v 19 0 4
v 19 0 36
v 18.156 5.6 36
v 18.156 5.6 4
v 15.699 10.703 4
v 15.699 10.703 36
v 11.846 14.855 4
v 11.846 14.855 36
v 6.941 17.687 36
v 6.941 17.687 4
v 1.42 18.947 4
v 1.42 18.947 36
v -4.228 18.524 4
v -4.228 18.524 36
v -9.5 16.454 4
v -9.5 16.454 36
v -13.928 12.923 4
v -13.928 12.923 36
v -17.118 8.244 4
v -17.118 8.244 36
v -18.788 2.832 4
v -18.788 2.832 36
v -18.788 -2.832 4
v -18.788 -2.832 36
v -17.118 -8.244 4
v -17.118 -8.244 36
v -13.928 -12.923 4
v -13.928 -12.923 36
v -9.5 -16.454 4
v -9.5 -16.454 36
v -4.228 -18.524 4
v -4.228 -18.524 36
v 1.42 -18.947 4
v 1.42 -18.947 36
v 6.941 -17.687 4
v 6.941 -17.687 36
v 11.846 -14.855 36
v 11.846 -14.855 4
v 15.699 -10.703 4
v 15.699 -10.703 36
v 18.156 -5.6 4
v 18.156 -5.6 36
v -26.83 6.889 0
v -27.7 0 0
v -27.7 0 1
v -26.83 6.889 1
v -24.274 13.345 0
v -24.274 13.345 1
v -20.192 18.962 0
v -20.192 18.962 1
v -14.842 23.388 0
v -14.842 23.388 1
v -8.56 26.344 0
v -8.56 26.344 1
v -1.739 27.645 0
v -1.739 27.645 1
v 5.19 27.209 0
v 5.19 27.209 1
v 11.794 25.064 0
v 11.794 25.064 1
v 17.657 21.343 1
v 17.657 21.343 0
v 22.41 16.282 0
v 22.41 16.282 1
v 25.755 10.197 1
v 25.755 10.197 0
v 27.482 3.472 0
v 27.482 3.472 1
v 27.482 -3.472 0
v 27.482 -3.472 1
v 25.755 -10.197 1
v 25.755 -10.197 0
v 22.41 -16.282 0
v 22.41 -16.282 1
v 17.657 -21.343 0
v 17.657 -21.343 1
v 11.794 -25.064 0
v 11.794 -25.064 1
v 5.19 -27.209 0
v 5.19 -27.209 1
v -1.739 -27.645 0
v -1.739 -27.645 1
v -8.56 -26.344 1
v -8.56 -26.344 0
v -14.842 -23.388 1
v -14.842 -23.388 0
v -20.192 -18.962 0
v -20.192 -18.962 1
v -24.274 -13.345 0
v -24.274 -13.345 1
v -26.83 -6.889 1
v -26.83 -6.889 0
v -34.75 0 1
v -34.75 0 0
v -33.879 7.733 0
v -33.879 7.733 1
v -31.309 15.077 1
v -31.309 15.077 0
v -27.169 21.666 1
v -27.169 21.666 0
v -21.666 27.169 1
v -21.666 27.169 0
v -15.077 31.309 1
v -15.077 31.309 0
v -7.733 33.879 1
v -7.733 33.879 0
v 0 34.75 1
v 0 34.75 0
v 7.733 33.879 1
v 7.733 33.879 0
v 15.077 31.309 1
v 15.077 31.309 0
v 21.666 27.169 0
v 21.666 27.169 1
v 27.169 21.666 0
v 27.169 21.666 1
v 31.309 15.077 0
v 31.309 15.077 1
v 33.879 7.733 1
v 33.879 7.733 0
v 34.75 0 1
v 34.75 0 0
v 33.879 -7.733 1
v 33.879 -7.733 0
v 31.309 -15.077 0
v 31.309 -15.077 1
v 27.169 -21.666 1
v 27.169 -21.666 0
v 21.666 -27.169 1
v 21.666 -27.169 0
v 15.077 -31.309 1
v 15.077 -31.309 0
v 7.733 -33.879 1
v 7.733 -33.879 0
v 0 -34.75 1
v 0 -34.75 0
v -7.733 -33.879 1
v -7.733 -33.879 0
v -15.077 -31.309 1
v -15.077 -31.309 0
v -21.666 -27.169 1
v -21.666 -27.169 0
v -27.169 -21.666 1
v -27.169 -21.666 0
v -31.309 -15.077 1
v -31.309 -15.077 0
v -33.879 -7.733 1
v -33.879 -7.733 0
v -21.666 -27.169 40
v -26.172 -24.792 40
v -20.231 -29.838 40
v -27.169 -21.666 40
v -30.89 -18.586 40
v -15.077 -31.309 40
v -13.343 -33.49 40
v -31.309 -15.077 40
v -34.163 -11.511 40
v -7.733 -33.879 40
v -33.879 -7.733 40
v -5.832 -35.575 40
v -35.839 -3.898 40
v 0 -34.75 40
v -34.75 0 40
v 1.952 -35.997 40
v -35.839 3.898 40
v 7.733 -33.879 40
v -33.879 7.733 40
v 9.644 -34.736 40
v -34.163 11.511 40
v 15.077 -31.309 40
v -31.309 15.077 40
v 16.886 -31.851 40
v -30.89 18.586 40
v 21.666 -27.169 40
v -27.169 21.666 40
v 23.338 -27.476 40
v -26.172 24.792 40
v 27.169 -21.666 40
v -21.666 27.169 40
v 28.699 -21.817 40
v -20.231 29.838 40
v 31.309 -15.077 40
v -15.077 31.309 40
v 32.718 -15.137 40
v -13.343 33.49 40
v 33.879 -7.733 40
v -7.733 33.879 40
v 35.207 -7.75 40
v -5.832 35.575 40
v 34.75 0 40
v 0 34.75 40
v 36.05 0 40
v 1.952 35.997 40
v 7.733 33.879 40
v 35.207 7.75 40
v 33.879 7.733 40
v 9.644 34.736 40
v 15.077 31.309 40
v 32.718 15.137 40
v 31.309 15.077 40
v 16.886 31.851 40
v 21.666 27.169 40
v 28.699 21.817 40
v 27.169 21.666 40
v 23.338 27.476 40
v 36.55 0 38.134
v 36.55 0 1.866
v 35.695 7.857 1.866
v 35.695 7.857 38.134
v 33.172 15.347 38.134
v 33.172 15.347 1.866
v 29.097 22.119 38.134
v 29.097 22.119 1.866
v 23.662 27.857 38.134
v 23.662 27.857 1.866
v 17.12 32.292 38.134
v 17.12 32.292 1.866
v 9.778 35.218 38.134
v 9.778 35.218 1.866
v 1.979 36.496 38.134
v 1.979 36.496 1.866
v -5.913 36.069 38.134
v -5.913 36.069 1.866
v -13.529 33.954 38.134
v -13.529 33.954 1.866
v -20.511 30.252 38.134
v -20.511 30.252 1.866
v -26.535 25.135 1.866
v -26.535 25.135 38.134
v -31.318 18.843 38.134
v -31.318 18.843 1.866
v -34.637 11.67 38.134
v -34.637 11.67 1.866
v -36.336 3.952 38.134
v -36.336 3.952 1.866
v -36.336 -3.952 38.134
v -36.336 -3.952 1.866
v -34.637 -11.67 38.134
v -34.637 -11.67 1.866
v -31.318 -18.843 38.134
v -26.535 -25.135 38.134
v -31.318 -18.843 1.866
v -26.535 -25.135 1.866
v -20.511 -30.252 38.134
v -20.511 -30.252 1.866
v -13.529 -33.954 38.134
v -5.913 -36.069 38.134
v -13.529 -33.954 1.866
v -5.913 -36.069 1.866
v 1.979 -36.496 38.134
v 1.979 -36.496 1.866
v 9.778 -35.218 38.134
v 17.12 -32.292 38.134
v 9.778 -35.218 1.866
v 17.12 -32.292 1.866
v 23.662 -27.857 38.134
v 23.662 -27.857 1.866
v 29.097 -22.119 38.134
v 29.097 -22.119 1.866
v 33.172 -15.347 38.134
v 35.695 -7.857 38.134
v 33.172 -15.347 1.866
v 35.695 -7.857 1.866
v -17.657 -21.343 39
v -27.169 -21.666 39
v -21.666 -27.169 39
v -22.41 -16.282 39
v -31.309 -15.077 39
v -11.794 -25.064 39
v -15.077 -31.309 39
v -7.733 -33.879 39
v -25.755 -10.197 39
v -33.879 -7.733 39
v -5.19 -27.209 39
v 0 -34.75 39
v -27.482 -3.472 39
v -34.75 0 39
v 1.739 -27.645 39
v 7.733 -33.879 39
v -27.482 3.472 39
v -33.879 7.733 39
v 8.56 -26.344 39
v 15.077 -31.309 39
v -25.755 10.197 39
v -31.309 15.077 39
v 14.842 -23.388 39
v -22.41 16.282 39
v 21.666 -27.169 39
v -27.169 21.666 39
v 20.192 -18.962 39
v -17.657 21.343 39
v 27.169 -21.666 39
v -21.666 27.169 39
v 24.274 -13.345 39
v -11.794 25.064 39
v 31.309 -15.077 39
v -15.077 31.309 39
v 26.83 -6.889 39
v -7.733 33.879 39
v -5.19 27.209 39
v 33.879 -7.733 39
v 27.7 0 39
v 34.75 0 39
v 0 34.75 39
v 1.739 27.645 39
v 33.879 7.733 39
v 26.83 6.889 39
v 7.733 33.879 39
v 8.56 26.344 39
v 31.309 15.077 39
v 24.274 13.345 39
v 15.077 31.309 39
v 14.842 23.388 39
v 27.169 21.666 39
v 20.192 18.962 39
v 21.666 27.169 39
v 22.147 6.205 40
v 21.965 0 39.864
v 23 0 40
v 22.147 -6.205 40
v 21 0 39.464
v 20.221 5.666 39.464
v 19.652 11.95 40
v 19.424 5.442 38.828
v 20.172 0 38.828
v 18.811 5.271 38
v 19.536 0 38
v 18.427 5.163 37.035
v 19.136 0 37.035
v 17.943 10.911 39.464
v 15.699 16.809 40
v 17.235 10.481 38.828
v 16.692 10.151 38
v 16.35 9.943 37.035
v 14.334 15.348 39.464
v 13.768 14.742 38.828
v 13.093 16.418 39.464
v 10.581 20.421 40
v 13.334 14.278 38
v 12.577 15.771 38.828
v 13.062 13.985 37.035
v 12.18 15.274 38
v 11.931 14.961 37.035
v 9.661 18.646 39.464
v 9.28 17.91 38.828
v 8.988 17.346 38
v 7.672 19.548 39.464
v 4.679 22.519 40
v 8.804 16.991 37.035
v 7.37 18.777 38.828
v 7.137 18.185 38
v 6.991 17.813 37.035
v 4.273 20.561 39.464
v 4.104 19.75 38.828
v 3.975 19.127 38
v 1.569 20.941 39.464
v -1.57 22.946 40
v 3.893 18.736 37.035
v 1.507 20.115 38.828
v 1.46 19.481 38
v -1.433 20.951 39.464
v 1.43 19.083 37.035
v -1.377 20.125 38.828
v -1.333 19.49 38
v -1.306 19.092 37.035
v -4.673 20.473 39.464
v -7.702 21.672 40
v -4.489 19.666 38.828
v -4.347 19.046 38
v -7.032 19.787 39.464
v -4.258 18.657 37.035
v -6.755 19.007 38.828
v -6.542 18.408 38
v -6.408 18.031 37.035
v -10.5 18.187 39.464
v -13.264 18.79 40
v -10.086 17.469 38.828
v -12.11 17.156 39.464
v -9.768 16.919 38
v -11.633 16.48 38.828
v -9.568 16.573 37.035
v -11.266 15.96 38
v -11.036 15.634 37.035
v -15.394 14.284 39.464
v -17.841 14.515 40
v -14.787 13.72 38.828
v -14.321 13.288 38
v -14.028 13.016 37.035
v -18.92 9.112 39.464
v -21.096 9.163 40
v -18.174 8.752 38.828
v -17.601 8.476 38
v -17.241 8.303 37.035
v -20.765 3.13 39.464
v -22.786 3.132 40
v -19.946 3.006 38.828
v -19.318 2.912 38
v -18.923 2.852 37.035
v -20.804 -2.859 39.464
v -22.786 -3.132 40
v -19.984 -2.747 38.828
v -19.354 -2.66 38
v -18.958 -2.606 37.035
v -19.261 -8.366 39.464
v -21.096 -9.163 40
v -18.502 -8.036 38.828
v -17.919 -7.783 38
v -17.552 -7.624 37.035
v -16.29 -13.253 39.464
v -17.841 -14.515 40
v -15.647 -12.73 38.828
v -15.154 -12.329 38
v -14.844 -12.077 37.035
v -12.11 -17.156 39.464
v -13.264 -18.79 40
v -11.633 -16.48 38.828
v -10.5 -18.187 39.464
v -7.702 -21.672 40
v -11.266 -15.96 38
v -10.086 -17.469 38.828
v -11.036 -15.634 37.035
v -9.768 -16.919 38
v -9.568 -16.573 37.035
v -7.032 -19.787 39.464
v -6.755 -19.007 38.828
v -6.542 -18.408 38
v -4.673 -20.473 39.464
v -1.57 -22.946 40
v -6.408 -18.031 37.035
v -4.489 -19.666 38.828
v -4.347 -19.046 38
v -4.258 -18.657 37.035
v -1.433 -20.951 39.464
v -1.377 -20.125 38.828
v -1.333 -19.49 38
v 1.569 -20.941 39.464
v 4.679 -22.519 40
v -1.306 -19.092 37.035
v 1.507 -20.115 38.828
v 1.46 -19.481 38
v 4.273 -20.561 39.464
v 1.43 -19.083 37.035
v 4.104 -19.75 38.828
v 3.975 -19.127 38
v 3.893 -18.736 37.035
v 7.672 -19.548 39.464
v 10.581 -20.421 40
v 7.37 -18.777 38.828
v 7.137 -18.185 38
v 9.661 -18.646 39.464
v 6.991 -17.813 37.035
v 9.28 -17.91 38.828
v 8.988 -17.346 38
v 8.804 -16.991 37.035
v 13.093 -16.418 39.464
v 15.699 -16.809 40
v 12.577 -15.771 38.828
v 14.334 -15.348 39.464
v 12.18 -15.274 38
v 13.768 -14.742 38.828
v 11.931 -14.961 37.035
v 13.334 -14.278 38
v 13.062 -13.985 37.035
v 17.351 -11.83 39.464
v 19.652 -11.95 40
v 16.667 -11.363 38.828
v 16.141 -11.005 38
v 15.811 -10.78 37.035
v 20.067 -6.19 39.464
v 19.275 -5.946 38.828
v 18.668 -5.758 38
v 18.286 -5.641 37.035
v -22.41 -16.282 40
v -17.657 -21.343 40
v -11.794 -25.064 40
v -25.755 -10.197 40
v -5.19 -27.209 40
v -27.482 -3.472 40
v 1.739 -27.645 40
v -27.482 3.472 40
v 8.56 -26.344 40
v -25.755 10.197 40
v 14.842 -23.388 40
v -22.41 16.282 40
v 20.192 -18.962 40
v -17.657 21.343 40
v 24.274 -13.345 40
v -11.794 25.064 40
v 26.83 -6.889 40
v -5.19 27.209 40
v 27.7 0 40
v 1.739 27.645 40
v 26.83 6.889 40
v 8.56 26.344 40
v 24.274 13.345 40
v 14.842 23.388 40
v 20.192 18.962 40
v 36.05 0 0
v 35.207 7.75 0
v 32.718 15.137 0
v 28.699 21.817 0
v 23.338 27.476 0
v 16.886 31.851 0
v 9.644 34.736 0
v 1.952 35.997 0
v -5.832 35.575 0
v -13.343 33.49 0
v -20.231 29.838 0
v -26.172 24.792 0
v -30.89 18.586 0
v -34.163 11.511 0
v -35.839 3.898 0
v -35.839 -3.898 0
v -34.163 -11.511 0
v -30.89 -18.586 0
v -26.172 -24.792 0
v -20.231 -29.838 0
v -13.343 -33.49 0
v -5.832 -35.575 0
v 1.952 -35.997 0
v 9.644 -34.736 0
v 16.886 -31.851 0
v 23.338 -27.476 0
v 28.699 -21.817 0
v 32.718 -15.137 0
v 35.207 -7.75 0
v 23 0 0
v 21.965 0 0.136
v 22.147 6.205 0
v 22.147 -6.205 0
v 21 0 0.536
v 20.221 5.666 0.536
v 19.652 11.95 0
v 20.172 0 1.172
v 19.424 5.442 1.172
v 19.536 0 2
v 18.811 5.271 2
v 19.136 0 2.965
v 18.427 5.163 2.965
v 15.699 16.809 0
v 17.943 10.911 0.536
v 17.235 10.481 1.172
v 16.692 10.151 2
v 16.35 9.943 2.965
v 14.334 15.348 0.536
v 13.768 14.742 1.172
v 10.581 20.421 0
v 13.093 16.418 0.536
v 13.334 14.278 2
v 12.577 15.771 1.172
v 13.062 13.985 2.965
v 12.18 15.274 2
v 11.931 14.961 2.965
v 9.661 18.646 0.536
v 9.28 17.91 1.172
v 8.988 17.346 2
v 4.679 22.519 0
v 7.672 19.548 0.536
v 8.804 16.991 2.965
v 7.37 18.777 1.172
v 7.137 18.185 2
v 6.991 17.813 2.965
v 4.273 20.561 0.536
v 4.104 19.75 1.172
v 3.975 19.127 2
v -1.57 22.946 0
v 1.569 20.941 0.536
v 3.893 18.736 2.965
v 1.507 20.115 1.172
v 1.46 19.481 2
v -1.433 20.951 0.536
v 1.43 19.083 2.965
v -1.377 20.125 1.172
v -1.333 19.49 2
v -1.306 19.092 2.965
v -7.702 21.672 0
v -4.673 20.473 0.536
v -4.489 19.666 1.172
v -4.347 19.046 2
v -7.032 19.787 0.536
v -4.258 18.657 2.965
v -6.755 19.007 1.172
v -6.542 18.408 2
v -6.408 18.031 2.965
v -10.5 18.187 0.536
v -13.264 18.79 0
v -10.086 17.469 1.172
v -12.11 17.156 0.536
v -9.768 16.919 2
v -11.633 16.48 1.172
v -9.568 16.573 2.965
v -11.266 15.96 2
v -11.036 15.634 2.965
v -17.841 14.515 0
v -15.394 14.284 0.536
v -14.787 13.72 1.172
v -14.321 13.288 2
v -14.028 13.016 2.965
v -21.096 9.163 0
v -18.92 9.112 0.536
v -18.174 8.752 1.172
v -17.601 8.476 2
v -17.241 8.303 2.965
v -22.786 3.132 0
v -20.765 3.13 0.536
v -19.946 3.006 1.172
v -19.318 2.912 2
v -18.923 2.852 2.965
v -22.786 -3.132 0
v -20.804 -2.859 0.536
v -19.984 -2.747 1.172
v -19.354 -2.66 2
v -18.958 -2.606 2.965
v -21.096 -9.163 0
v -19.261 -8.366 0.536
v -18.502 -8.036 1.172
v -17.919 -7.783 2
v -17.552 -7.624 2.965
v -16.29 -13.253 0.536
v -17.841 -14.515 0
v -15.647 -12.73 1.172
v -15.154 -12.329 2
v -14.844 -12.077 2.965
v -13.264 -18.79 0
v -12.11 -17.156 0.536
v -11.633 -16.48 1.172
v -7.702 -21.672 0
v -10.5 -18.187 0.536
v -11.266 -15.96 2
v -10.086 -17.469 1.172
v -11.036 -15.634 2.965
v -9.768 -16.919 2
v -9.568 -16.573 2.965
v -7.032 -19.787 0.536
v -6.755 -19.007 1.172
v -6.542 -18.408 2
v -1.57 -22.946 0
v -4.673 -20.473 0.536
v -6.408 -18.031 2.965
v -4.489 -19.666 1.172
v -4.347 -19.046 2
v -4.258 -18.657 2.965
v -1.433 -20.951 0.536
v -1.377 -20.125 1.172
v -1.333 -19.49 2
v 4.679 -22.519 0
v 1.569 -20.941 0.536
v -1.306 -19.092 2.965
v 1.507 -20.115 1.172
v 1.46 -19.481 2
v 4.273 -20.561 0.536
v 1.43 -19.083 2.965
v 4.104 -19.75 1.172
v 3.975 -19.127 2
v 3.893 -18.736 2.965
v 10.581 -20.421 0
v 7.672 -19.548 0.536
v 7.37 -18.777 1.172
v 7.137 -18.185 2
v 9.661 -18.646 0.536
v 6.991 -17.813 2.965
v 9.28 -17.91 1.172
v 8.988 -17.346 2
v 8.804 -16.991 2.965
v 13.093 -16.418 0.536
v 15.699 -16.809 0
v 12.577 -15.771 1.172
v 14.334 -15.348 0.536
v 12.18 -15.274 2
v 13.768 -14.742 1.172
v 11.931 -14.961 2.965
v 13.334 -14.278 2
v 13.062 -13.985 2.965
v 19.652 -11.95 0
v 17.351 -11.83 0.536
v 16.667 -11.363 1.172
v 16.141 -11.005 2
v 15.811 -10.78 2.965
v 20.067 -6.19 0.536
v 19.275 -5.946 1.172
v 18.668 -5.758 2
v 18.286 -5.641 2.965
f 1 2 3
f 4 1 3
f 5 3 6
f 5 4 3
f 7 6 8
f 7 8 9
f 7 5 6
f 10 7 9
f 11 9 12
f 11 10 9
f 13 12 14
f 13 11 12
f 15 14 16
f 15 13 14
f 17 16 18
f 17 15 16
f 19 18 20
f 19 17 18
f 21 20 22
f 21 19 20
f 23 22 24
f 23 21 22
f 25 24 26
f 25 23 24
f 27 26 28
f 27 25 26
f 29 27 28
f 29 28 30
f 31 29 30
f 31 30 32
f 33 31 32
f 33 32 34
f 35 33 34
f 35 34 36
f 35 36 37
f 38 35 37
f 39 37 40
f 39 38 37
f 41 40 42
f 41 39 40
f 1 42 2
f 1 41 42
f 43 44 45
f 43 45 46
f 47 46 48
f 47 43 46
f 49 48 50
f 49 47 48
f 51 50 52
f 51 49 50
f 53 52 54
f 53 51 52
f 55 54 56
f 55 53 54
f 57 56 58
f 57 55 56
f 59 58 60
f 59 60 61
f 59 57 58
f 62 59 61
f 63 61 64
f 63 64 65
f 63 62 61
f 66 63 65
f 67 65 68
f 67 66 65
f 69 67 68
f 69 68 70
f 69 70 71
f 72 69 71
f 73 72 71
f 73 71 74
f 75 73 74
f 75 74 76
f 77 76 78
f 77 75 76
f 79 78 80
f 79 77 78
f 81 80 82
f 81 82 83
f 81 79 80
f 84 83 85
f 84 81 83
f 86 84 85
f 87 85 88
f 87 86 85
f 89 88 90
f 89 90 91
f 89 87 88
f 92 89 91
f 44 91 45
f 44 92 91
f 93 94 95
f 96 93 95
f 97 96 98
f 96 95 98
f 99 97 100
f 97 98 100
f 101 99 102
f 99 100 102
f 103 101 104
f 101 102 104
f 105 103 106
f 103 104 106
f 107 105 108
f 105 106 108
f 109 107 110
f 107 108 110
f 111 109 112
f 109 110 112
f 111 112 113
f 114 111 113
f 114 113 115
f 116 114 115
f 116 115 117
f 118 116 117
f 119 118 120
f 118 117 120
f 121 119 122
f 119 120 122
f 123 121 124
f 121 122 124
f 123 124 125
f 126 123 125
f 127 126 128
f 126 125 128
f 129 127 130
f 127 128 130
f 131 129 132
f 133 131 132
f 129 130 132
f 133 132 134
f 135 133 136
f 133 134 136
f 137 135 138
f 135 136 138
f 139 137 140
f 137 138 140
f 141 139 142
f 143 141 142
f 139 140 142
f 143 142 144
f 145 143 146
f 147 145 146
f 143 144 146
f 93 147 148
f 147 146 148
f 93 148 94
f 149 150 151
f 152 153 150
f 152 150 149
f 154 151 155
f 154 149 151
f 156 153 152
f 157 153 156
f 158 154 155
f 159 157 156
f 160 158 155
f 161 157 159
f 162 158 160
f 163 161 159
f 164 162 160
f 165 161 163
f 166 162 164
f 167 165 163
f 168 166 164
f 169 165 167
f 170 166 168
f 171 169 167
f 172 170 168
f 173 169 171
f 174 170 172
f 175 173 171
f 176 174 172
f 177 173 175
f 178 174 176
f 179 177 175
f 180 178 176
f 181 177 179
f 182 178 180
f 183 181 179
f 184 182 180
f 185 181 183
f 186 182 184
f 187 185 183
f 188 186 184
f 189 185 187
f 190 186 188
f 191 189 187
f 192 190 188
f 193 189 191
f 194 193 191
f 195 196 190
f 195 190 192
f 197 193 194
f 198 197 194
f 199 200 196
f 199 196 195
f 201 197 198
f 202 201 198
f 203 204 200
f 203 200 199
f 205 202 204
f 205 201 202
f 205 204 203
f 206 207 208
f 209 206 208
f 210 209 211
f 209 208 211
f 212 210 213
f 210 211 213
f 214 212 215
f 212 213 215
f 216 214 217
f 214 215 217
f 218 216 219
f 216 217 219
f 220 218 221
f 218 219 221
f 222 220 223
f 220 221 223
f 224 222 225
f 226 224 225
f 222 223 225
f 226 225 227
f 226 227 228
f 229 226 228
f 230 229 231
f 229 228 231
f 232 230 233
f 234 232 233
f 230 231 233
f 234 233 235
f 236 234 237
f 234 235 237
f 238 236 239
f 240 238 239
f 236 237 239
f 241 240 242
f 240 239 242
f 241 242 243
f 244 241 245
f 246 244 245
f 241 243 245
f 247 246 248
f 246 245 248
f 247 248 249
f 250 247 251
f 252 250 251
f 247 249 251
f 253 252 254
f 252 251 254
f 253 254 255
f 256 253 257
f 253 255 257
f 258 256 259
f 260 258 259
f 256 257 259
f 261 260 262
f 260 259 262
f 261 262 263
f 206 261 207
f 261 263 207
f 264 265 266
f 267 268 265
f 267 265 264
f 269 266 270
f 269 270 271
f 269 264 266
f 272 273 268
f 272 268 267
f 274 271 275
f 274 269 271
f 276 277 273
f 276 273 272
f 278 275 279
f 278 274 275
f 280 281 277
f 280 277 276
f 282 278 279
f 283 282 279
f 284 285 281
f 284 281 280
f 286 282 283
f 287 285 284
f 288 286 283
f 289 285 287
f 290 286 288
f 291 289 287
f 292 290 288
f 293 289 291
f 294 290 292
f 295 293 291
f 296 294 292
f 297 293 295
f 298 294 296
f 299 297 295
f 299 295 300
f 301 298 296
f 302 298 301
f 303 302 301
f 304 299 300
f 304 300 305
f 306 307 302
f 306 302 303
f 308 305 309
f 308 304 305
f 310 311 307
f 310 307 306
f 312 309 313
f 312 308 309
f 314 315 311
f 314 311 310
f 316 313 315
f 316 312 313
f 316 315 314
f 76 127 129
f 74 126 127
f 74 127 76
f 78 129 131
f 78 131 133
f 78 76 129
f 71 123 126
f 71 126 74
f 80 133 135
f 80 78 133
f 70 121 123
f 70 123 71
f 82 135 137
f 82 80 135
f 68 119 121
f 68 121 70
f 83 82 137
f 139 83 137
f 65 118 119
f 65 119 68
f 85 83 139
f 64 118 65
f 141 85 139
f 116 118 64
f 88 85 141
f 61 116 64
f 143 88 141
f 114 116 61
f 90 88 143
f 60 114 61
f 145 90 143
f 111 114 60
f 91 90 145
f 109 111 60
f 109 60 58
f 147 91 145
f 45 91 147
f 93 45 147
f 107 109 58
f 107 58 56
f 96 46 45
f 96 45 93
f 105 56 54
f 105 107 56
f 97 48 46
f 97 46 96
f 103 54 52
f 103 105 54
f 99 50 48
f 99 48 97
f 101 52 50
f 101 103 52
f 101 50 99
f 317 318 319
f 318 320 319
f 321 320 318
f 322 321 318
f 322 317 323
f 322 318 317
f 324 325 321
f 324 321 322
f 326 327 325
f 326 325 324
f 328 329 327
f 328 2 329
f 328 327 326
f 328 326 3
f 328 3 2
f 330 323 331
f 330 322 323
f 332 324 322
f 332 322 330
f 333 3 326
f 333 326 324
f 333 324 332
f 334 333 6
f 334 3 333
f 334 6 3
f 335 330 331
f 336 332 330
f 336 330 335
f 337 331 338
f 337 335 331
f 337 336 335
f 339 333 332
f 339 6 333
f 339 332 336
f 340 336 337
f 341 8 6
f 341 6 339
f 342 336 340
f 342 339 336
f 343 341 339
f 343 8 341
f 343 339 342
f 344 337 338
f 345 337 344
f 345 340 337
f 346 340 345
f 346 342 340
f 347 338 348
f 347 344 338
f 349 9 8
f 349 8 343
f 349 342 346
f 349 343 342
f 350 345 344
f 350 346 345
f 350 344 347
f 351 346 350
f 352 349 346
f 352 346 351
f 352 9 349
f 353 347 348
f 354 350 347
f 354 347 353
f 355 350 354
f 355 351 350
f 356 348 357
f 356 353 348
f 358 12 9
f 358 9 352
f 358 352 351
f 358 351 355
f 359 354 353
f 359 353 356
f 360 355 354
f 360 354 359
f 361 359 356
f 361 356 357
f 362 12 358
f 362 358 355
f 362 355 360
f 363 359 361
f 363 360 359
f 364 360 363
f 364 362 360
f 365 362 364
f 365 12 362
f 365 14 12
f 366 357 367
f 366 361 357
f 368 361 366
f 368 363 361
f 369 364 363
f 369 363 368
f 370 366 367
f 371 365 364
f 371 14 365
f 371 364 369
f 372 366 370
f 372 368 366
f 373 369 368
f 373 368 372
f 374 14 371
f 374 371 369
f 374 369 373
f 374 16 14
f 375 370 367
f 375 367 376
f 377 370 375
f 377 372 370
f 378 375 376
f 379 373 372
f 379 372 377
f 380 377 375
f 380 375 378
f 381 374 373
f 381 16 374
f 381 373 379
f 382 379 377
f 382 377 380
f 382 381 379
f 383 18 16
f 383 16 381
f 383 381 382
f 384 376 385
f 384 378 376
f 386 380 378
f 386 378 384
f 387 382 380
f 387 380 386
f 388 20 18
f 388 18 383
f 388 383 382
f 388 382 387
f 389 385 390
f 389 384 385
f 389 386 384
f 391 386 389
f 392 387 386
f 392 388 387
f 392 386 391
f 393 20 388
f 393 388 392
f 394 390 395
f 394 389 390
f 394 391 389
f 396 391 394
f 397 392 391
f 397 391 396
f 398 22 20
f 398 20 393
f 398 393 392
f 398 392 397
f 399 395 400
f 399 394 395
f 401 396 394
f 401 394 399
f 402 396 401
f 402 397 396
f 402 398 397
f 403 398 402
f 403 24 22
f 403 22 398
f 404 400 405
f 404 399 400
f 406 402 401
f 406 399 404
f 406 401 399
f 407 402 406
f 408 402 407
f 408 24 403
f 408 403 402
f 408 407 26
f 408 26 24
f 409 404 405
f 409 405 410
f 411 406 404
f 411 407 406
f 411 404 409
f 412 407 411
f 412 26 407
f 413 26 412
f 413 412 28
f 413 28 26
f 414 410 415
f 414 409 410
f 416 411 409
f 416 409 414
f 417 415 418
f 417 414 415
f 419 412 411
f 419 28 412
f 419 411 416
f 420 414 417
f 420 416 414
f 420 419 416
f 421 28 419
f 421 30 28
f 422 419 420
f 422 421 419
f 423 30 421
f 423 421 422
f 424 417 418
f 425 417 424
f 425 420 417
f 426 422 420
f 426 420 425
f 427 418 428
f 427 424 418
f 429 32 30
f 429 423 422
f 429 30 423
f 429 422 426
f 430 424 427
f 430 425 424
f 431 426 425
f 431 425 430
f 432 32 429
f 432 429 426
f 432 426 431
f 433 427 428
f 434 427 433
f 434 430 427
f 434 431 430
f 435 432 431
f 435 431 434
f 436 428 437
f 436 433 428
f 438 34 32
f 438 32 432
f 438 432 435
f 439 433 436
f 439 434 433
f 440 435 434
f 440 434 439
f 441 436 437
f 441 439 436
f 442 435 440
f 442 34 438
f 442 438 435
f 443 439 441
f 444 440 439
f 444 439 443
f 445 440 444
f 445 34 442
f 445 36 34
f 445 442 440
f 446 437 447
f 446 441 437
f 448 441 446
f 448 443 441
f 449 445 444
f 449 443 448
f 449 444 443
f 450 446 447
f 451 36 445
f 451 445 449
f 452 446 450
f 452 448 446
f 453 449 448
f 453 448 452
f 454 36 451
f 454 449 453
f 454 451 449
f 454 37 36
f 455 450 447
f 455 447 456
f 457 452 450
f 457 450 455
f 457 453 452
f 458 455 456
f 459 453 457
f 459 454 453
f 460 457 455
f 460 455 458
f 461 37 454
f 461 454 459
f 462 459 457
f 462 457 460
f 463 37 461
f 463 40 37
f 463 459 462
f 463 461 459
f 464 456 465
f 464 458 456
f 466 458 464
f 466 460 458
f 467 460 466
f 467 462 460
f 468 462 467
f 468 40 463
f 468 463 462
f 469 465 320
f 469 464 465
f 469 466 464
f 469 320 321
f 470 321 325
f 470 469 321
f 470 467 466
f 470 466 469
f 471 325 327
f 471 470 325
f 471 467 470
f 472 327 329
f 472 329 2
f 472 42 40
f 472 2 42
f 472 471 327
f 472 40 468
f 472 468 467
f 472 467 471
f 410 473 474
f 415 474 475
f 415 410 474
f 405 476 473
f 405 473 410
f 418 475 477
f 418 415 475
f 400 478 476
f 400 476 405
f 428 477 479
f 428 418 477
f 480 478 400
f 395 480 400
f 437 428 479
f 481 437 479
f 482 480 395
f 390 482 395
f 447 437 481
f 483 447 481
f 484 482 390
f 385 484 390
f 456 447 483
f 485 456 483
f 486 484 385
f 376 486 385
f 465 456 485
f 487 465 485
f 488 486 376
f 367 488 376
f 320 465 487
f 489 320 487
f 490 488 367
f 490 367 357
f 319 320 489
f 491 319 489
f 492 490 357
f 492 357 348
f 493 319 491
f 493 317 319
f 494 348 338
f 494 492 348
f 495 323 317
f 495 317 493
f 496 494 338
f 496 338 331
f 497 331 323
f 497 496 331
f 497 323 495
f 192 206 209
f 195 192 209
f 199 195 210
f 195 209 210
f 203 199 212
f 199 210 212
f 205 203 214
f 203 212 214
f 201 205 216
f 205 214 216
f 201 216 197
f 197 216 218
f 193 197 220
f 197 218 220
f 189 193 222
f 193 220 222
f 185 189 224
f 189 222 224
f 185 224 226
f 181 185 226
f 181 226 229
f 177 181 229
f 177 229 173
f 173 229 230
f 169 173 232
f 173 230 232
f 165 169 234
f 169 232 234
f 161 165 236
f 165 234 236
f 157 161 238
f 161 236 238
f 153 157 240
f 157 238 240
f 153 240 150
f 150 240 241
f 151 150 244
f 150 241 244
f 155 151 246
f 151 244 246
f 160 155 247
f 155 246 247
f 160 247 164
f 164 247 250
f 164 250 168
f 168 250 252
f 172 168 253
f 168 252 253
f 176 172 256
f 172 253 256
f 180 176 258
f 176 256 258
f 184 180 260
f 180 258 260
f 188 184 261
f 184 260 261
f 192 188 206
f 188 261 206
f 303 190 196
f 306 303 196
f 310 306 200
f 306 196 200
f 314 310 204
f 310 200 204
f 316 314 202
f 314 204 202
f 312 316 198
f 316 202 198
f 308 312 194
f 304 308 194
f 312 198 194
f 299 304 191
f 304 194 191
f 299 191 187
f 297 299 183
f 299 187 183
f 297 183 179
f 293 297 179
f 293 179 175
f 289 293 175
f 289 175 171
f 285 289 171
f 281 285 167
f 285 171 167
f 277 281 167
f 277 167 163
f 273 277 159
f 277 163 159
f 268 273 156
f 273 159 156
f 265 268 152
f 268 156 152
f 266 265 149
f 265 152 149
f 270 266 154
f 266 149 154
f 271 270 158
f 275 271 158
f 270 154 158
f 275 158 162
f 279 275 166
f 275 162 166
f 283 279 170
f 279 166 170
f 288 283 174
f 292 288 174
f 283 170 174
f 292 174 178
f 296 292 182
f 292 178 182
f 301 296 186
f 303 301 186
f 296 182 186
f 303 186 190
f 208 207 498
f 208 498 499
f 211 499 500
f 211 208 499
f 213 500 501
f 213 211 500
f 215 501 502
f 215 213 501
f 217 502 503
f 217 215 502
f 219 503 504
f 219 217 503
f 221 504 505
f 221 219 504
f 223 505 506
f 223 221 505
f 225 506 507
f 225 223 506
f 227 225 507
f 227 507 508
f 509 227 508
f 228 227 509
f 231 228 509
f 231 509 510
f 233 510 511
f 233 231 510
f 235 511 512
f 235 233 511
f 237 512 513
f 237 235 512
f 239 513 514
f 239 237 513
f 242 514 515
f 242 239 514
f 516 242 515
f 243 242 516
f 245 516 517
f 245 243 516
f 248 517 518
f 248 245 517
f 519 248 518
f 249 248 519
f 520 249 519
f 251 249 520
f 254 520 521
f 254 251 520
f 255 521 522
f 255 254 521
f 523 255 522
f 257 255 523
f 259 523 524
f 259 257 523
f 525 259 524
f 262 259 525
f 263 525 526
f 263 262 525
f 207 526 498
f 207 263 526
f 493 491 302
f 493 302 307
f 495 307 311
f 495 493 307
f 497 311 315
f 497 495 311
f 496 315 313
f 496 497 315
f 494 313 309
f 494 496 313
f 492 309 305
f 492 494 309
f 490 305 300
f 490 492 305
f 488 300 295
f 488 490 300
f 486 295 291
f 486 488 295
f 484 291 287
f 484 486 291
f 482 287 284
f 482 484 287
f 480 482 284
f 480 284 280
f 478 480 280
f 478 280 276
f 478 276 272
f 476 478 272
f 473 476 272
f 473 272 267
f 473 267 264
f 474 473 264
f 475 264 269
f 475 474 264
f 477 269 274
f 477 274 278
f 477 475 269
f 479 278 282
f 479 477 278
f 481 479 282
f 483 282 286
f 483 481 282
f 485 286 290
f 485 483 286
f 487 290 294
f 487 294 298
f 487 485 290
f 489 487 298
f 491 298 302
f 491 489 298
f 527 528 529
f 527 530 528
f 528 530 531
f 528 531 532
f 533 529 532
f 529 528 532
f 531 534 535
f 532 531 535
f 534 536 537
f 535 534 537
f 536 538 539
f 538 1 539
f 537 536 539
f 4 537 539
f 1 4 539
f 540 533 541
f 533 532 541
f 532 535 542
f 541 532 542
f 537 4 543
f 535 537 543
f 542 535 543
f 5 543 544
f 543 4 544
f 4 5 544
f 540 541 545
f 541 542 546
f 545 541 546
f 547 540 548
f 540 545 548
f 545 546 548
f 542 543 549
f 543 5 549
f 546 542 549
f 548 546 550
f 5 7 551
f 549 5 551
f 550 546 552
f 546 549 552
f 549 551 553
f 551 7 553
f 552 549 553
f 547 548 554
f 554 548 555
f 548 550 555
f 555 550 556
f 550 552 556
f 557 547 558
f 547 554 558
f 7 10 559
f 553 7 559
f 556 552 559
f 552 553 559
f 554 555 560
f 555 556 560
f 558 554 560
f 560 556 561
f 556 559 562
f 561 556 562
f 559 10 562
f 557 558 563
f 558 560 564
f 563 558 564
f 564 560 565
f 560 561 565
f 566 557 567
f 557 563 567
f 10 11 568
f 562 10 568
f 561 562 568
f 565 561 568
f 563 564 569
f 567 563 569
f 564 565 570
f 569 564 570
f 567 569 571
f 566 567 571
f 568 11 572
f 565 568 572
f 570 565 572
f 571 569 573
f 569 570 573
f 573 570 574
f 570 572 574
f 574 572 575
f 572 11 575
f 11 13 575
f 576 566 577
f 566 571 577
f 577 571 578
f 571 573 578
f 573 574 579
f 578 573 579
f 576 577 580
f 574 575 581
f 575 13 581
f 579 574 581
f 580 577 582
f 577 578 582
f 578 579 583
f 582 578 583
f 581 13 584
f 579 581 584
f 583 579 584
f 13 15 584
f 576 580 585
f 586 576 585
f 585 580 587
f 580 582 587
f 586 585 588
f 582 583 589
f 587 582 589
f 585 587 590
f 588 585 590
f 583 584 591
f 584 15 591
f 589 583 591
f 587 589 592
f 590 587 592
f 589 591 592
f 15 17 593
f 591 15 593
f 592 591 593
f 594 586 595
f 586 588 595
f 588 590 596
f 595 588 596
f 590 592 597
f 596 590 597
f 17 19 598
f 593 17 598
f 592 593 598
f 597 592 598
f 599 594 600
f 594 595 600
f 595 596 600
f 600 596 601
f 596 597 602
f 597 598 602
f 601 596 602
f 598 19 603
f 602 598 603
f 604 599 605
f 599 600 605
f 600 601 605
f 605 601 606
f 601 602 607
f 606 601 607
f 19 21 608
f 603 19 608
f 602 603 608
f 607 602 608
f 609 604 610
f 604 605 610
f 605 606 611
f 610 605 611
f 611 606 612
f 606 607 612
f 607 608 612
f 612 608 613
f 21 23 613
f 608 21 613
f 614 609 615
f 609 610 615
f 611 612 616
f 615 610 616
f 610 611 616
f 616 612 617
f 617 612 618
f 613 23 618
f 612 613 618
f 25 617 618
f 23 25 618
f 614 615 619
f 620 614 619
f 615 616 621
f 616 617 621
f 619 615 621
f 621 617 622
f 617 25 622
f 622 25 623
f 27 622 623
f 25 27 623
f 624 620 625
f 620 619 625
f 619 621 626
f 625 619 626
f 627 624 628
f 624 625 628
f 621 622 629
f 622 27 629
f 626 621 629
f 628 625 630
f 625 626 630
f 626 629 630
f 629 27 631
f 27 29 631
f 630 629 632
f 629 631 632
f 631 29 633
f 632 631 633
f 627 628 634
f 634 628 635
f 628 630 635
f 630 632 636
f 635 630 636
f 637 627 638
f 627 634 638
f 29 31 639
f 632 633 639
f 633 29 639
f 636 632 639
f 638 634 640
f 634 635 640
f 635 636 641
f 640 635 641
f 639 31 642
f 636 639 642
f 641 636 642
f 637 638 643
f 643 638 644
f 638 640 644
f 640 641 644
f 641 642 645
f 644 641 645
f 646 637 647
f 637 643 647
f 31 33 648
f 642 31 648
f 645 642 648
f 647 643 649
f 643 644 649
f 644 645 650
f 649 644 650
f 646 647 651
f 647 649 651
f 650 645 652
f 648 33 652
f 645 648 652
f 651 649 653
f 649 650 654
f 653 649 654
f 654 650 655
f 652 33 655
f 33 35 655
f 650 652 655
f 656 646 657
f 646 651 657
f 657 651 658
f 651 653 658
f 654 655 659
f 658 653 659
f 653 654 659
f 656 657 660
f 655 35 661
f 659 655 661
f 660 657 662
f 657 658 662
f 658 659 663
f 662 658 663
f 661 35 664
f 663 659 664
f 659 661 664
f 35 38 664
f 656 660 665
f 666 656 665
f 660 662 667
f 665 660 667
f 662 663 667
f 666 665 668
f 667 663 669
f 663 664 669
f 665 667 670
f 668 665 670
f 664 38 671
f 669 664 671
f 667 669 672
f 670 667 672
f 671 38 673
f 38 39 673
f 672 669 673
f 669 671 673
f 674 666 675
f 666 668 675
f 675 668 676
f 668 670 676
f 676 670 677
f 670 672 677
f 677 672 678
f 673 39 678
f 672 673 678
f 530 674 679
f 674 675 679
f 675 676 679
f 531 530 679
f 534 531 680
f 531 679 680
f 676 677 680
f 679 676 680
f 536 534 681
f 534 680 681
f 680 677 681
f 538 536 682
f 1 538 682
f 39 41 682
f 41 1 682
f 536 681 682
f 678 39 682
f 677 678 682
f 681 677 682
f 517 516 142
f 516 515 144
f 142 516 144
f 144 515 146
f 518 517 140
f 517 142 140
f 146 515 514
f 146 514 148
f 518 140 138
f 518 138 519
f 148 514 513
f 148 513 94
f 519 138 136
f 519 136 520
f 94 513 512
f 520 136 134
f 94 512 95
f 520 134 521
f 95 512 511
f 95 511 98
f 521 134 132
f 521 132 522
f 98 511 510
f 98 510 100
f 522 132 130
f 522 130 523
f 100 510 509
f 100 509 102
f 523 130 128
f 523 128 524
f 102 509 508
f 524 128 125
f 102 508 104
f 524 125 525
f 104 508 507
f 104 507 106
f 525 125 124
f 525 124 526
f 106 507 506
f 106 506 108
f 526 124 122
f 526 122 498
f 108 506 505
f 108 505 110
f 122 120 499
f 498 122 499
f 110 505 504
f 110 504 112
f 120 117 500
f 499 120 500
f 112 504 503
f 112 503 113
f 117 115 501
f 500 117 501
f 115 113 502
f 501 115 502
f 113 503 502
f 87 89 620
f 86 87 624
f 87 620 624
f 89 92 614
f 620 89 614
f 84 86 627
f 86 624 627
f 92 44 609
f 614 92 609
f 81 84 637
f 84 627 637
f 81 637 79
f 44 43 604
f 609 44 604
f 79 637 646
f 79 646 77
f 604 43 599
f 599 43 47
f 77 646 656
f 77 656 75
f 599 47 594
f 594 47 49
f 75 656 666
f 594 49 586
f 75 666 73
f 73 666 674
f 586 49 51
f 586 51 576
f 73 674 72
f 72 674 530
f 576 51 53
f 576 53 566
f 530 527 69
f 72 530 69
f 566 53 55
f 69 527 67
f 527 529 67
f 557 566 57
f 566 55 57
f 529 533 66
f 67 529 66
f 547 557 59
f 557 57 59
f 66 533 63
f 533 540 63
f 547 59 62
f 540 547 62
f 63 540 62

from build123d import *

# Parameters (mm, degrees)
SKETCH1_R             = 36.55
SKETCH1_R_2           = 19
EXTRUDE1_DEPTH        = 40
SKETCH2_R             = 34.75
SKETCH2_R_2           = 27.7
EXTRUDE2_DEPTH        = 1
SKETCH3_R             = 34.75
SKETCH3_R_2           = 27.7
EXTRUDE3_DEPTH        = 1
FILLET1_R             = 4
CHAMFER1_SIZE         = 0.5
CHAMFER1_SIZE2        = 1.866025404
CHAMFER1_PART_2_SIZE  = 0.5
CHAMFER1_PART_2_SIZE2 = 1.866025404


with BuildPart() as part:
    # Sketch1 → Extrude1 (new body)
    with BuildSketch(Plane.XY):
        Circle(SKETCH1_R)
        Circle(SKETCH1_R_2, mode=Mode.SUBTRACT)
    extrude(amount=EXTRUDE1_DEPTH)

    # Sketch2 → Extrude2 (cut)
    with BuildSketch(Plane.XY.offset(40)):
        Circle(SKETCH2_R)
        Circle(SKETCH2_R_2, mode=Mode.SUBTRACT)
    extrude(amount=-EXTRUDE2_DEPTH, mode=Mode.SUBTRACT)

    # Sketch3 → Extrude3 (cut)
    with BuildSketch(Plane(origin=(0, 0, 0), x_dir=(-1, 0, 0), z_dir=(0, 0, -1))):
        Circle(SKETCH3_R)
        Circle(SKETCH3_R_2, mode=Mode.SUBTRACT)
    extrude(amount=-EXTRUDE3_DEPTH, mode=Mode.SUBTRACT)

    # Fillet1
    fillet1_edges = [part.edges().sort_by_distance(p)[0] for p in [
        (-19, 0, 0),
        (-19, 0, 40),
    ]]
    fillet(fillet1_edges, radius=FILLET1_R)

    # Chamfer1
    chamfer1_edges = [part.edges().sort_by_distance(p)[0] for p in [
        (-36.55, 0, 0),
    ]]
    chamfer1_side = [part.faces().sort_by_distance(p)[0] for p in [
        (-35.516209886, 0, 0),
    ]]
    chamfer(chamfer1_edges, length=CHAMFER1_SIZE, length2=CHAMFER1_SIZE2, reference=chamfer1_side[0])

    # Chamfer1 part 2
    chamfer1_part_2_edges = [part.edges().sort_by_distance(p)[0] for p in [
        (-36.55, 0, 40),
    ]]
    chamfer1_part_2_side = [part.faces().sort_by_distance(p)[0] for p in [
        (-35.516209886, 0, 40),
    ]]
    chamfer(chamfer1_part_2_edges, length=CHAMFER1_PART_2_SIZE, length2=CHAMFER1_PART_2_SIZE2, reference=chamfer1_part_2_side[0])


solid = part.part
